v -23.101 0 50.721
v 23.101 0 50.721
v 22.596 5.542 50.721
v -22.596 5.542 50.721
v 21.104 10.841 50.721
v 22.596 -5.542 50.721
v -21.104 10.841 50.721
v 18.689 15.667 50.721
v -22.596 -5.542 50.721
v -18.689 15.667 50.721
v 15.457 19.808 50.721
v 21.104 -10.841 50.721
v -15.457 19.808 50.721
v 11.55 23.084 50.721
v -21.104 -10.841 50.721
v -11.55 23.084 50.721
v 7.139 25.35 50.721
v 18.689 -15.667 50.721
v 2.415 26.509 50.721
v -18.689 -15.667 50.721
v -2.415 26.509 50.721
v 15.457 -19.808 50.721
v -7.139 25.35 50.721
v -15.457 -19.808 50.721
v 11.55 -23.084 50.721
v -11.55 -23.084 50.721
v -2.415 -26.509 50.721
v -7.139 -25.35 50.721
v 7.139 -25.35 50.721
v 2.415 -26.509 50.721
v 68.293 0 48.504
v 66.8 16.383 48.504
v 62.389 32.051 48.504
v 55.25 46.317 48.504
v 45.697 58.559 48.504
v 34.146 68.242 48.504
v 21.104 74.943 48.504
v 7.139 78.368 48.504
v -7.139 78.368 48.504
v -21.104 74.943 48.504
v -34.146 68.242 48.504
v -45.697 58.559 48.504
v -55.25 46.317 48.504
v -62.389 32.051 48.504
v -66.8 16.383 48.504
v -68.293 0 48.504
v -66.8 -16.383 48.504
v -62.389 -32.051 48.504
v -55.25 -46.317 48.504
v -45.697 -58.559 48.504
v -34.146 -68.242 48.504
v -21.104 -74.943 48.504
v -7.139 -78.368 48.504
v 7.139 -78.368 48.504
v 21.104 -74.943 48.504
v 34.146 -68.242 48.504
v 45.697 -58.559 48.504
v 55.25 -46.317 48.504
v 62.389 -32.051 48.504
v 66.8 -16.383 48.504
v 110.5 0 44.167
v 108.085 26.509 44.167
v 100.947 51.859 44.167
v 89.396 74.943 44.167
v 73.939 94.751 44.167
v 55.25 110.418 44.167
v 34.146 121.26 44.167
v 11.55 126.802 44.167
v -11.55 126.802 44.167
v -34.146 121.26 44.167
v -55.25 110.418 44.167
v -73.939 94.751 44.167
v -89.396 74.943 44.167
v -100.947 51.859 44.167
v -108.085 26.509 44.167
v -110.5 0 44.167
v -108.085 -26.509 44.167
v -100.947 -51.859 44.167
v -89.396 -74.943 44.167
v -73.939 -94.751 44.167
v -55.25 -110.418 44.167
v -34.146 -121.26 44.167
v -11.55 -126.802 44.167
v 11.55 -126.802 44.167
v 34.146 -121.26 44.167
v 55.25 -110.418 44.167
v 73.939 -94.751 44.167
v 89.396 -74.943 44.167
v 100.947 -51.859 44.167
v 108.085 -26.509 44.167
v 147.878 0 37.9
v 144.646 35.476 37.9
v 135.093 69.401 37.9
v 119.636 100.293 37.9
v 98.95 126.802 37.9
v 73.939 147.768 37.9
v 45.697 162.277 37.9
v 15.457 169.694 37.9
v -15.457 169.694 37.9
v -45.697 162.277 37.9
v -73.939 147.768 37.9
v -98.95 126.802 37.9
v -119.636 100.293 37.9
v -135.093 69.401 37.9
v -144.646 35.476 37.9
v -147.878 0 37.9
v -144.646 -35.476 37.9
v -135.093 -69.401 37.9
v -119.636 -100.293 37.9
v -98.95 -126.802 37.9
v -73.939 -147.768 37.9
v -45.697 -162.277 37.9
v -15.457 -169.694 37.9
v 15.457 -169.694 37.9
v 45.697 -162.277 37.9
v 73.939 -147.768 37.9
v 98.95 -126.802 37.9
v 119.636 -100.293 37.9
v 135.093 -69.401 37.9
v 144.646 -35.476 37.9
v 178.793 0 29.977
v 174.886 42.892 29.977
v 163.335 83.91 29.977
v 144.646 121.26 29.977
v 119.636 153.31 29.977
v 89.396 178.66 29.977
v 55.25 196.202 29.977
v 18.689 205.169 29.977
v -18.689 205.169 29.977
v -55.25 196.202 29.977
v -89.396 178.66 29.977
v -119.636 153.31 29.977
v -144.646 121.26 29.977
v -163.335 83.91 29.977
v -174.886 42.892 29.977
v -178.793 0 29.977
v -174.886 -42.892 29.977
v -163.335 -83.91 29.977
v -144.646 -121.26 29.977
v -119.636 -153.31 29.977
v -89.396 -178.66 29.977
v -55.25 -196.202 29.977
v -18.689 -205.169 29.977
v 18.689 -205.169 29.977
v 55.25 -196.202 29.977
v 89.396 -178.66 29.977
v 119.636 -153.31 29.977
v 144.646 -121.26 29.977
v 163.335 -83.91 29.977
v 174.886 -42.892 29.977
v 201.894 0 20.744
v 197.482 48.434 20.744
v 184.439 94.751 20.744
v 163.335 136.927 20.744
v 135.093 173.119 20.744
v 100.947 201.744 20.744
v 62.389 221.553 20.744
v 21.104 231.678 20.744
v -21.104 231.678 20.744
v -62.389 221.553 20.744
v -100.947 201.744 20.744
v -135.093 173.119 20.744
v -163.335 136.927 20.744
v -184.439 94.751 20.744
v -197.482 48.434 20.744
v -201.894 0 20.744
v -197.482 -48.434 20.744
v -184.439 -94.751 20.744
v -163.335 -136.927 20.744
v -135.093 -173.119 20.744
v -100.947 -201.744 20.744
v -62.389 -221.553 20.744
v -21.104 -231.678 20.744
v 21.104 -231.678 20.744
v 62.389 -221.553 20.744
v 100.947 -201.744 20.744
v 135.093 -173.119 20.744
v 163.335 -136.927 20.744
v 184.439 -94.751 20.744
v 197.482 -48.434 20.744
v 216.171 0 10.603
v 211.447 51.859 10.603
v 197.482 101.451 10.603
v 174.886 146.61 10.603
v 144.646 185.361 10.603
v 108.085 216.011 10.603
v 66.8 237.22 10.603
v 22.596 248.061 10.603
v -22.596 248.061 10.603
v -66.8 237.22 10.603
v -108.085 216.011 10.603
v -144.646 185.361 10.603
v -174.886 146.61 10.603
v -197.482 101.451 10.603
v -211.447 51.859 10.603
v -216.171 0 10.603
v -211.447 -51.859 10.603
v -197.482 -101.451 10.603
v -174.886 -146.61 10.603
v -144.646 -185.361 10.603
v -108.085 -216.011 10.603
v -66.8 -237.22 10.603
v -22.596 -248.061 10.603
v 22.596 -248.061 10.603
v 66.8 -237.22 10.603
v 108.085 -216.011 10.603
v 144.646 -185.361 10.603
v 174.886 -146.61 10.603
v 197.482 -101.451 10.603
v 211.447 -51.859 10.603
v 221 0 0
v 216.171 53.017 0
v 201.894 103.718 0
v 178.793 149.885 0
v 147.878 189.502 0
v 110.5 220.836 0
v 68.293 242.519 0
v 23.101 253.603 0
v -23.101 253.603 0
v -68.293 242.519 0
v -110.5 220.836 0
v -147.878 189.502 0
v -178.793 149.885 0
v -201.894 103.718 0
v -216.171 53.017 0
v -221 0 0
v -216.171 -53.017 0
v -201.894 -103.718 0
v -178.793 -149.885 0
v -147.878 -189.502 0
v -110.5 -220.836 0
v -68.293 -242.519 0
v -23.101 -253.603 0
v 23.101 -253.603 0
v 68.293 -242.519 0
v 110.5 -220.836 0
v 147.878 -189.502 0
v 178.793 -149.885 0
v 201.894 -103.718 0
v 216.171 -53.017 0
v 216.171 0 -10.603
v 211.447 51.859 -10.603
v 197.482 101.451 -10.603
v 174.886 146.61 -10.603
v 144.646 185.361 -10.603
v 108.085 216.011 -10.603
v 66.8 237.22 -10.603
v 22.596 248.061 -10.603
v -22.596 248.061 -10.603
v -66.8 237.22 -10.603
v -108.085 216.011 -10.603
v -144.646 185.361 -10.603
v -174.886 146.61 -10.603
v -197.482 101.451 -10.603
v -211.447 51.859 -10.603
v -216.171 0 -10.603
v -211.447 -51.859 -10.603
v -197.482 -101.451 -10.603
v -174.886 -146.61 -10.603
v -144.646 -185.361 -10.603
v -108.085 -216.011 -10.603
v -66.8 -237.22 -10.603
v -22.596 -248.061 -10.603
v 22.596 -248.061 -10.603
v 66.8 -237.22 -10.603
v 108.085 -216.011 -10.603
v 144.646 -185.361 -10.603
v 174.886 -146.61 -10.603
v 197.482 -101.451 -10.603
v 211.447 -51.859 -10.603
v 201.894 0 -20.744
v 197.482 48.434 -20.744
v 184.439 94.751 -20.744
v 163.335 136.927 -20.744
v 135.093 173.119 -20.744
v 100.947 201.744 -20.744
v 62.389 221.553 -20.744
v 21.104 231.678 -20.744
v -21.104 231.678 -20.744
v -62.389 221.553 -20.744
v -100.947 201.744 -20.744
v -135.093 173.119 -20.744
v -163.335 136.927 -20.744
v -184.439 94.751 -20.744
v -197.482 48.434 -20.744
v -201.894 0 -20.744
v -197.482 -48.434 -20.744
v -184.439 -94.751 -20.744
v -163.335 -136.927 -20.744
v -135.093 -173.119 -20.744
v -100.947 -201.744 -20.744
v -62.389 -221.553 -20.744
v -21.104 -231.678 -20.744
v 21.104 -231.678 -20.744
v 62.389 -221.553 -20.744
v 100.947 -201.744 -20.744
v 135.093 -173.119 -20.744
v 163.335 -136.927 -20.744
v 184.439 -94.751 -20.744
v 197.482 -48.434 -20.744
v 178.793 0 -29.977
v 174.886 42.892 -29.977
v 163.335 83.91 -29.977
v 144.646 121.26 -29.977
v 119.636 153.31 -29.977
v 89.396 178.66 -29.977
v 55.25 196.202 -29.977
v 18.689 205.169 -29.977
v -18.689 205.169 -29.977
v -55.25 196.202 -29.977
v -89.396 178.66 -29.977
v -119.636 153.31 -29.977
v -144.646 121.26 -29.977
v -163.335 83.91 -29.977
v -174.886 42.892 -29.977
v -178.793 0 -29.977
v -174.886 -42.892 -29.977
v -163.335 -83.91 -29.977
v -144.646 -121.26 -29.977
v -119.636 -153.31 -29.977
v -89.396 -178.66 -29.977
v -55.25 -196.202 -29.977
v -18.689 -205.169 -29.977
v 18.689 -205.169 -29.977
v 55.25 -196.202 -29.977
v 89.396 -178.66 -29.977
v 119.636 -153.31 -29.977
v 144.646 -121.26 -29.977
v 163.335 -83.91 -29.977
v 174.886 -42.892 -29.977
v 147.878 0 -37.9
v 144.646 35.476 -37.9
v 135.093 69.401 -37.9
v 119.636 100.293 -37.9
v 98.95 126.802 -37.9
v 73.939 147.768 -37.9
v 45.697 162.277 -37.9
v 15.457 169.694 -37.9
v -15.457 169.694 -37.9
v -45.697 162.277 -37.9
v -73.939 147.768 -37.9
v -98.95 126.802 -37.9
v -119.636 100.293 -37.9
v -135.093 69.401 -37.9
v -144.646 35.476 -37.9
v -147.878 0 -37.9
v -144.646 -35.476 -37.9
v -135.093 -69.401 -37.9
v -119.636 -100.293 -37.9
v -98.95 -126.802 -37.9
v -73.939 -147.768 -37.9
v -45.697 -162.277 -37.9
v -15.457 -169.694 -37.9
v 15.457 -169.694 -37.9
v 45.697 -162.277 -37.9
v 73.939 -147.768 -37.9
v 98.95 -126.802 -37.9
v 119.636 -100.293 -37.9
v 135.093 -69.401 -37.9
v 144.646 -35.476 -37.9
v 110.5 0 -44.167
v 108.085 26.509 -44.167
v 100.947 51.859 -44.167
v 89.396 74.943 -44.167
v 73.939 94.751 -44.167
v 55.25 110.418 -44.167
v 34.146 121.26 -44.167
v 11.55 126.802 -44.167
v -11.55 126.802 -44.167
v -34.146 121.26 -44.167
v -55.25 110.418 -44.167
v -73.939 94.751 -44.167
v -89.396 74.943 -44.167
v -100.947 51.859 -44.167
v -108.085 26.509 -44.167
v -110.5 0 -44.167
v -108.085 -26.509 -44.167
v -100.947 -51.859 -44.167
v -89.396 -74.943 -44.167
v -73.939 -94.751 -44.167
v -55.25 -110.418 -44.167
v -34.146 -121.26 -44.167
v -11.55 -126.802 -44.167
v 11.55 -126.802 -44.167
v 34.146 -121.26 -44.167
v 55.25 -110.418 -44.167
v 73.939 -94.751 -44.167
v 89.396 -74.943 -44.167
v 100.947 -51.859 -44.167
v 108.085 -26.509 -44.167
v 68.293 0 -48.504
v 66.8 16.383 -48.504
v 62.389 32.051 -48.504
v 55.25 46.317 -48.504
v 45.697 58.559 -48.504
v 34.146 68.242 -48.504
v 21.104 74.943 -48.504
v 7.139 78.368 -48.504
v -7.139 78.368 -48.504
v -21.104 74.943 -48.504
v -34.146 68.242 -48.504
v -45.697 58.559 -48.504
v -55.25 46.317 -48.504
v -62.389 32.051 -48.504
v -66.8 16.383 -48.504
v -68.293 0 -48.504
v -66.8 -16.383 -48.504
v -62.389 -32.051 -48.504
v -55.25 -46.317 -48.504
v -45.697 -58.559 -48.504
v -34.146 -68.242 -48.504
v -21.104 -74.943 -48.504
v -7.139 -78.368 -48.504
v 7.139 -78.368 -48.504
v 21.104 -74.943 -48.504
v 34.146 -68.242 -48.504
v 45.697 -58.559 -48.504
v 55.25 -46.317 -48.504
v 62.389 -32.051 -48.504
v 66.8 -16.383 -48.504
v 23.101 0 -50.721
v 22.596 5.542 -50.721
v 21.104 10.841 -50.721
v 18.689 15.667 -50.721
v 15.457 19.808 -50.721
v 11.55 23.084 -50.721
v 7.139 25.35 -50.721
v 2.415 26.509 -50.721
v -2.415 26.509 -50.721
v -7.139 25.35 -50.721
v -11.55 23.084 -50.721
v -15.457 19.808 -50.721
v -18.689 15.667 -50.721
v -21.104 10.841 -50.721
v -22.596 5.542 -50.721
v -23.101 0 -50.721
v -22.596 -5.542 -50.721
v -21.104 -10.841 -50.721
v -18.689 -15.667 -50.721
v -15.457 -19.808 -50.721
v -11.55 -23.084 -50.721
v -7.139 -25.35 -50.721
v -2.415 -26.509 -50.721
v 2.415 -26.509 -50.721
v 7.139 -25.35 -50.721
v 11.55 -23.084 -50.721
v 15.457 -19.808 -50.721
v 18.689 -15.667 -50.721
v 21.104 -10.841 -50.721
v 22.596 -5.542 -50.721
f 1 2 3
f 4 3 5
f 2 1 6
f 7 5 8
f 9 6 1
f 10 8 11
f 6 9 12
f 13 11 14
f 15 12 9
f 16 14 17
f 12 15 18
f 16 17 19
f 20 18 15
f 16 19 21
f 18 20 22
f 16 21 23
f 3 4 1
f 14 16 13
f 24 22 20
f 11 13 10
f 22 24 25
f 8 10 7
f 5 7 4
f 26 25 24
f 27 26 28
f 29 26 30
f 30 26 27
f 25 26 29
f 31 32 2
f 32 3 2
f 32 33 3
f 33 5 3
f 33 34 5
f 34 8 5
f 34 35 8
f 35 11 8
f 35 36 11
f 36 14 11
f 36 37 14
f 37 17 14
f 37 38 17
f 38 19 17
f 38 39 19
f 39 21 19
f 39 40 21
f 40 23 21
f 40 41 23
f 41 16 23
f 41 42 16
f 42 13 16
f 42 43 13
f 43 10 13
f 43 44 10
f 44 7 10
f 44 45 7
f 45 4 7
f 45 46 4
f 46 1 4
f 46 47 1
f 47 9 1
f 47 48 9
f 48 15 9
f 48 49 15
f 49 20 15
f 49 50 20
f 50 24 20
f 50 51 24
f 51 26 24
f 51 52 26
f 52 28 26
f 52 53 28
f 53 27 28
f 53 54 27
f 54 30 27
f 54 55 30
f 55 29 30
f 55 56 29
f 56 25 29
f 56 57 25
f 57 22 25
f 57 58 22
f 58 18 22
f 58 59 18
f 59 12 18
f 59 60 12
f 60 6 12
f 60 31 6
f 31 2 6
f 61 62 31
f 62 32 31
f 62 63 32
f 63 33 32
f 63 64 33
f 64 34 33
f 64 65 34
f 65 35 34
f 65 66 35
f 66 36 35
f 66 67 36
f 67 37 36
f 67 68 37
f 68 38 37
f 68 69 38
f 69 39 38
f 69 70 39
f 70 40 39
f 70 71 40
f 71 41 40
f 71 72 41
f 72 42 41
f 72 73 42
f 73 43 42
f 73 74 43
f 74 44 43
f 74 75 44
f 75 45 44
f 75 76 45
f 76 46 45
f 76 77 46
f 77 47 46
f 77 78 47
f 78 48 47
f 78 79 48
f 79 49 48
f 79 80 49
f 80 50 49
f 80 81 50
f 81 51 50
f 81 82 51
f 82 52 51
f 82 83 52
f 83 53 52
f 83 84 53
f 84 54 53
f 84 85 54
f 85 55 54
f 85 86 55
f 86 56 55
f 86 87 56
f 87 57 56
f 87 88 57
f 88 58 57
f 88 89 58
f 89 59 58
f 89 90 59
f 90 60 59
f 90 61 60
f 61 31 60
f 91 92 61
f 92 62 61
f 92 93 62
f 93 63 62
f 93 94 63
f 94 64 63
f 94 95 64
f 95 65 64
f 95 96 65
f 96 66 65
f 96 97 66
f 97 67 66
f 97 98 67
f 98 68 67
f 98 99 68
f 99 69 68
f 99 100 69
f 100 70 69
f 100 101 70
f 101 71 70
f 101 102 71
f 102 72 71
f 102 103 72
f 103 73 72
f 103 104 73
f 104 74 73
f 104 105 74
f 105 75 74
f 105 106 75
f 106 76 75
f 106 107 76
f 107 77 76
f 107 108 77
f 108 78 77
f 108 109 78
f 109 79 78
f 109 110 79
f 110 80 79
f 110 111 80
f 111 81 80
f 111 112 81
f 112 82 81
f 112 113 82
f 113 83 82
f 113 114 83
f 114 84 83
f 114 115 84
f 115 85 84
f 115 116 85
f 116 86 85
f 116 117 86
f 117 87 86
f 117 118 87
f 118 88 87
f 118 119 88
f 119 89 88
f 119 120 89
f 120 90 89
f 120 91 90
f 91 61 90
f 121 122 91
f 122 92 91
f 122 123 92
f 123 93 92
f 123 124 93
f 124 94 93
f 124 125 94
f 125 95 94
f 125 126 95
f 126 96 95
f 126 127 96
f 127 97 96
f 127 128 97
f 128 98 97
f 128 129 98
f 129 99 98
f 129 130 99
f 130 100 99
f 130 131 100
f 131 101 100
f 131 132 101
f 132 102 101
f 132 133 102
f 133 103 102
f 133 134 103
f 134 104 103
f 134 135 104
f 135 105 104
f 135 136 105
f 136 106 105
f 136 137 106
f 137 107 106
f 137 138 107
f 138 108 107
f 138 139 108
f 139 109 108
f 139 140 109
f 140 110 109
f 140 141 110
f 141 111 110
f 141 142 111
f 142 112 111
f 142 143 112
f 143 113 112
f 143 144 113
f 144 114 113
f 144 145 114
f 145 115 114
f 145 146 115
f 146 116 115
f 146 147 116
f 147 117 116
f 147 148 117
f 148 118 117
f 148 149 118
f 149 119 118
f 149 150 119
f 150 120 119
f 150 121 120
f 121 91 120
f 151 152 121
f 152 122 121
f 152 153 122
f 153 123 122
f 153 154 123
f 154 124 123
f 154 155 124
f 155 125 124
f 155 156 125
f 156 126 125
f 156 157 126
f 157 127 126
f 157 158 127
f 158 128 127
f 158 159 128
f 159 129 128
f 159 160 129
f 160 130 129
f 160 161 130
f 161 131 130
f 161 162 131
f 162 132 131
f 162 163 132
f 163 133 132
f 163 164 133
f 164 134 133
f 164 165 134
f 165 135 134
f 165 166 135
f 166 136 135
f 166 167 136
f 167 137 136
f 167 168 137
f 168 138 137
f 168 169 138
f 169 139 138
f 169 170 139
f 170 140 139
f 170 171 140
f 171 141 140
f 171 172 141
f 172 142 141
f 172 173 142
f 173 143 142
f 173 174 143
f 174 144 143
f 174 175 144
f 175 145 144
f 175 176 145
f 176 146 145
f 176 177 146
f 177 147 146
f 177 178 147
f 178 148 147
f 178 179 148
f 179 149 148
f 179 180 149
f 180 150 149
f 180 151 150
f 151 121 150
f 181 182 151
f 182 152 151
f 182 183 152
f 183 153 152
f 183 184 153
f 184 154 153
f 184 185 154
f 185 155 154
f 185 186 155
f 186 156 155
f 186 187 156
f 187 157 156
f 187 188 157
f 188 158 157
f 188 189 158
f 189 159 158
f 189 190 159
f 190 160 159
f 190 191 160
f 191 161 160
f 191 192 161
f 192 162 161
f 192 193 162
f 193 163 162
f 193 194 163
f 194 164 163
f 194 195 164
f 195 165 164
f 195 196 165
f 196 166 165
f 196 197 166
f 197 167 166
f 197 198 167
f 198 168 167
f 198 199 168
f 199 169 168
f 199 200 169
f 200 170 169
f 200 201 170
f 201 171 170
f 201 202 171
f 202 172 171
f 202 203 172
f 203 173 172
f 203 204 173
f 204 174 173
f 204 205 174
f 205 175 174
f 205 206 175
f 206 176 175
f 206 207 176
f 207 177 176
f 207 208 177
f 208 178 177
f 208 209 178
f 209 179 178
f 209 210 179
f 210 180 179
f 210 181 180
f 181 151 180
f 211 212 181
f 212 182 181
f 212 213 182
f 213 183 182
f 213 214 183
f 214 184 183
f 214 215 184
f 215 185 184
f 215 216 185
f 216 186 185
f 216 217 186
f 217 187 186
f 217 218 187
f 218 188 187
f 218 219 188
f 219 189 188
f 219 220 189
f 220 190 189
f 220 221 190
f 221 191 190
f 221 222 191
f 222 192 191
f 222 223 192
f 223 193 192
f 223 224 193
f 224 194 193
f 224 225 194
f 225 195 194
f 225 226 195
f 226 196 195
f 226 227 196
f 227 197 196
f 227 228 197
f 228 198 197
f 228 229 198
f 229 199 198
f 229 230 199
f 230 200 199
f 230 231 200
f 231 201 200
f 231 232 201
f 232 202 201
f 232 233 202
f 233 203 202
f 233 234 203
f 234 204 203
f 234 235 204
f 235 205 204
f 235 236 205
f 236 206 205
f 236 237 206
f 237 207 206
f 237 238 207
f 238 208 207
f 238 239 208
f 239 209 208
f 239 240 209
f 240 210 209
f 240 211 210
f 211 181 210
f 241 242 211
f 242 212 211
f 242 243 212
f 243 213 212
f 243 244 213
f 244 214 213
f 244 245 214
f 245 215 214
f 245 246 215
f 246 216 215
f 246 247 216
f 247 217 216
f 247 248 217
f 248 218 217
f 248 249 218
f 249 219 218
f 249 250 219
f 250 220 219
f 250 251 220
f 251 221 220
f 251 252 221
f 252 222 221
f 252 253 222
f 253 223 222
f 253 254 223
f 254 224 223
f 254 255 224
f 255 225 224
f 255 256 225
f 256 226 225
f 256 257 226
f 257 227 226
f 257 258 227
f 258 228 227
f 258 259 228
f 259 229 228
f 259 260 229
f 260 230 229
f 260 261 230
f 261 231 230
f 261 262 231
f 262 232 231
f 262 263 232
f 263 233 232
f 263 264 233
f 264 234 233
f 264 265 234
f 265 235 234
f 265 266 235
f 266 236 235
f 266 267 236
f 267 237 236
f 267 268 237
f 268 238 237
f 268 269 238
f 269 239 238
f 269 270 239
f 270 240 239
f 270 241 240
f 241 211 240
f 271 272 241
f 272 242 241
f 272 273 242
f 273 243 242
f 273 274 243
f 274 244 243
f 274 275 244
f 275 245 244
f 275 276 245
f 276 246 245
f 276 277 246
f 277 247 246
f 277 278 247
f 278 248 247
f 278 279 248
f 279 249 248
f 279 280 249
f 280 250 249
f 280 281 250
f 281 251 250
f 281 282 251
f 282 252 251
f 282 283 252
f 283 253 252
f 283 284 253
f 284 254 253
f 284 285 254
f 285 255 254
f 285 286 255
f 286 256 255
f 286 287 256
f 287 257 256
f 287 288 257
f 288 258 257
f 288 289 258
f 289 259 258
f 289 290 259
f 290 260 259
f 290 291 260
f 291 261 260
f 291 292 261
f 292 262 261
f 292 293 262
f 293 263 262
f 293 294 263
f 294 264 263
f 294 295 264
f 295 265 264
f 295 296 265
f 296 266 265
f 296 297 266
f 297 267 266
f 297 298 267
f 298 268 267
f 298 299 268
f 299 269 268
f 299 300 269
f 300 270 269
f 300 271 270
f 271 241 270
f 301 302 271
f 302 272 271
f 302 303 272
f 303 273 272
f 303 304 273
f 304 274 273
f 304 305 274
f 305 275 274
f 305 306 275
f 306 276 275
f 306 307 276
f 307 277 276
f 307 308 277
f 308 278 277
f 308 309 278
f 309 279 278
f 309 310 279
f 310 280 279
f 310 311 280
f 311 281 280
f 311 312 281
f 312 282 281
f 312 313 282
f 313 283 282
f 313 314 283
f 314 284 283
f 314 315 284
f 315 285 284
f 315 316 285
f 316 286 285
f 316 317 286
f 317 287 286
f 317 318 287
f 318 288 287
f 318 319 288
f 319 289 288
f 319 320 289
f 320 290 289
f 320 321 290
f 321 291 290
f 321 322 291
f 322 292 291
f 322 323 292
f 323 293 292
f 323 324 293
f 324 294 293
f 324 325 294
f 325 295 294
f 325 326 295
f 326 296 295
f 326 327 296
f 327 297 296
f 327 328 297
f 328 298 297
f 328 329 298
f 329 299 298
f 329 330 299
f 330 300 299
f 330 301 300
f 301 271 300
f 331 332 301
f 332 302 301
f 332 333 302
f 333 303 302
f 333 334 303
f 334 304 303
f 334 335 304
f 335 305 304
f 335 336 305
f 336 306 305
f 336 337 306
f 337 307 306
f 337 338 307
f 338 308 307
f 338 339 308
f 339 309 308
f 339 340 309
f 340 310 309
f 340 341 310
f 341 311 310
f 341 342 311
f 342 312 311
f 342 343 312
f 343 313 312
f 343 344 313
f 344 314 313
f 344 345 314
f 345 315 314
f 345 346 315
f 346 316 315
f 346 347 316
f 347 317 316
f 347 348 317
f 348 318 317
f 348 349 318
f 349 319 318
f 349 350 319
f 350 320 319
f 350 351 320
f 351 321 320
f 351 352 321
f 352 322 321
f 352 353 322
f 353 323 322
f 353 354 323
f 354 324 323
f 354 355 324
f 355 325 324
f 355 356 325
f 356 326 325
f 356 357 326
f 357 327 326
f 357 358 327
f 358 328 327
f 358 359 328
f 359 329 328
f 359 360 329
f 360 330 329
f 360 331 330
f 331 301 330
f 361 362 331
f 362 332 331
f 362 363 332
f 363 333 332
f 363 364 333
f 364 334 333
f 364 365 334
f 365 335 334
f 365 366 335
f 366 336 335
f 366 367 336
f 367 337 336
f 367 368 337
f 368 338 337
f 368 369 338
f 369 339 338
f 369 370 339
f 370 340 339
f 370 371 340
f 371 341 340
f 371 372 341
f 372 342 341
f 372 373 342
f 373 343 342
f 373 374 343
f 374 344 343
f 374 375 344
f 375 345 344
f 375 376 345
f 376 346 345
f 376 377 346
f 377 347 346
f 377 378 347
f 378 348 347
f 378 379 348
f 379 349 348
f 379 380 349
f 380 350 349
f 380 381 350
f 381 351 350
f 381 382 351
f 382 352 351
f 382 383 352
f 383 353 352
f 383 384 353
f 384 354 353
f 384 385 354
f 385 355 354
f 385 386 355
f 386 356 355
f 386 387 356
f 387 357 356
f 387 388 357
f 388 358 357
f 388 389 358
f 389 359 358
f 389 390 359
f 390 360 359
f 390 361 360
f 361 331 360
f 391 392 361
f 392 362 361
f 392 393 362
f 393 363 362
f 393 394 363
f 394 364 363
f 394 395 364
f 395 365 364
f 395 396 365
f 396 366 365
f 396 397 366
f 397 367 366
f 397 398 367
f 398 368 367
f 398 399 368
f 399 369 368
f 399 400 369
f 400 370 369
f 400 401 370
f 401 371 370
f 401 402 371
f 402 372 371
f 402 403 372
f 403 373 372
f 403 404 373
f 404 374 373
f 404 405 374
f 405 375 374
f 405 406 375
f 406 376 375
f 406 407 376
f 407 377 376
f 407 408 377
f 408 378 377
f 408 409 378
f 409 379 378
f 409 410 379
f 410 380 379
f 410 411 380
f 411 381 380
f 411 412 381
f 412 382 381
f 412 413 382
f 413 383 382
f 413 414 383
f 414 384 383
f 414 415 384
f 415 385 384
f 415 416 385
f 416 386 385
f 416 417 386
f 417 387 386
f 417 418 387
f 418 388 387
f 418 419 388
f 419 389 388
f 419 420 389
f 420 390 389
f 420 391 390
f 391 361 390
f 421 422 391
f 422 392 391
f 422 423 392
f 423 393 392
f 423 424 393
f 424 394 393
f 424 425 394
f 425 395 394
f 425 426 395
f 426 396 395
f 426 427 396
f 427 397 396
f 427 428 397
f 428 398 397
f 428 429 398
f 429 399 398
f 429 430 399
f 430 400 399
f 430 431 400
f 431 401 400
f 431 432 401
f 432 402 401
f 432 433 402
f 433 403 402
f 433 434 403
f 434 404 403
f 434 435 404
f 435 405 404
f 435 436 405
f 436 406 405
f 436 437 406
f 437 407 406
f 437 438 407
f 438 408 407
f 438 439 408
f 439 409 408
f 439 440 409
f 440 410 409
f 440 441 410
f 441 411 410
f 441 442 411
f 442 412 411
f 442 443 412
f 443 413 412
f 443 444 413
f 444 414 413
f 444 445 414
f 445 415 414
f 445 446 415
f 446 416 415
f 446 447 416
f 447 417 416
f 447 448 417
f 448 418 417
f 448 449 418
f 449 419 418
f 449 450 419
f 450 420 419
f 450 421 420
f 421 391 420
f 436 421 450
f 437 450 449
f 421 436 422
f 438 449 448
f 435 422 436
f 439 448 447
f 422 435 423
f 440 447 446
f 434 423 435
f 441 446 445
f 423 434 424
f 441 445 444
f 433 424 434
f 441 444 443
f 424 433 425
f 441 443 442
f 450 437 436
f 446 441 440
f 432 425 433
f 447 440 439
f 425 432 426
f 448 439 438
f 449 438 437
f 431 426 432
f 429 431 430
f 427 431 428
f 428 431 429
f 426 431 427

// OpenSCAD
// Generated by SolidPython 1.0.1 on 2020-07-29 00:46:51


scale(v = [13, 15, 3]) {
	sphere(r = 17);
}
/***********************************************
*********      SolidPython code:      **********
************************************************
 
# import packages: SolidPython
from solid import *
from solid.utils import *
from itertools import chain, combinations, permutations


class Resize:

    def __init__(self, scad_file):
        self.scad_file = scad_file
        #self.scad_file = import_scad(scad_file)
        # cone/cylinder param:
        self.r1 = 0
        self.r2 = 0
        self.h = 0
        # rectangular prism param:
        self.w = 0
        self.l = 0
        # ellipse param:
        self.r = 0

    # import OpenScad code (file name corresponds to shape)


    # classify shape + parameters
    def assign(self, param1, param2, param3):
        if self.scad_file == 'cone.scad':
            self.r1 = param1
            self.r2 = param2
            self.h = param3
        elif self.scad_file == 'cylinder.scad':
            self.r1 = param1
            self.r2 = param2
            self.h = param3
        elif self.scad_file == 'rectangularPrism.scad':
            self.h = param1
            self.l = param2
            self.w = param3
        else:
            self.r = param1
            self.h = param2

    # resize parameters
    def iterate(self):
        x = range(3, 20, 2)
        i = 1
        if self.scad_file == 'cone.scad':
            tempList = list(permutations(x, 2))
            for temp in tempList:
                param1 = temp[0]
                param2 = temp[1]
                filepath = 'produced_scad_files/' + 'cone' + str(param1) + '_' + str(param2) + '_' + '.scad'
                scad_render_to_file(cylinder(h=param1, r1=param2, r2=0), filepath)

        elif self.scad_file == 'cylinder.scad':
            tempList = list(permutations(x, 3))
            for temp in tempList:
                param1 = temp[0]
                param2 = temp[1]
                filepath = 'produced_scad_files/' + 'cylinder' + str(param1) + '_' + str(param2) + '_' + '.scad'
                scad_render_to_file(cylinder(h=param1, r1=param2, r2=param2), filepath)

        elif self.scad_file == 'rectangularPrism.scad':
            tempList = list(permutations(x, 3))
            for temp in tempList:
                param1 = temp[0]
                param2 = temp[1]
                param3 = temp[2]
                filepath = 'produced_scad_files/' + 'rectangularPrism' + str(param1) + '_' + str(param2) + '_' + str(
                    param3) + '.scad'
                scad_render_to_file(cube(size=(param1, param2, param3)), filepath)

        elif self.scad_file == 'ellipse.scad':
            tempList = list(permutations(x, 4))
            for temp in tempList:
                param1 = temp[0]
                param2 = temp[1]
                param3 = temp[2]
                param4 = temp[3]
                filepath = 'produced_scad_files/' + 'ellipse' + str(param1) + '_' + str(param2) + '_' + str(param3) + '_' + str(param4) + '.scad'
                scad_render_to_file(scale([param1, param2, param3])(sphere(r=param4)), filepath)

    def render_to_scadfile(self):
        scad_render_to_file(scad, 'example.scad') 
 
************************************************/
